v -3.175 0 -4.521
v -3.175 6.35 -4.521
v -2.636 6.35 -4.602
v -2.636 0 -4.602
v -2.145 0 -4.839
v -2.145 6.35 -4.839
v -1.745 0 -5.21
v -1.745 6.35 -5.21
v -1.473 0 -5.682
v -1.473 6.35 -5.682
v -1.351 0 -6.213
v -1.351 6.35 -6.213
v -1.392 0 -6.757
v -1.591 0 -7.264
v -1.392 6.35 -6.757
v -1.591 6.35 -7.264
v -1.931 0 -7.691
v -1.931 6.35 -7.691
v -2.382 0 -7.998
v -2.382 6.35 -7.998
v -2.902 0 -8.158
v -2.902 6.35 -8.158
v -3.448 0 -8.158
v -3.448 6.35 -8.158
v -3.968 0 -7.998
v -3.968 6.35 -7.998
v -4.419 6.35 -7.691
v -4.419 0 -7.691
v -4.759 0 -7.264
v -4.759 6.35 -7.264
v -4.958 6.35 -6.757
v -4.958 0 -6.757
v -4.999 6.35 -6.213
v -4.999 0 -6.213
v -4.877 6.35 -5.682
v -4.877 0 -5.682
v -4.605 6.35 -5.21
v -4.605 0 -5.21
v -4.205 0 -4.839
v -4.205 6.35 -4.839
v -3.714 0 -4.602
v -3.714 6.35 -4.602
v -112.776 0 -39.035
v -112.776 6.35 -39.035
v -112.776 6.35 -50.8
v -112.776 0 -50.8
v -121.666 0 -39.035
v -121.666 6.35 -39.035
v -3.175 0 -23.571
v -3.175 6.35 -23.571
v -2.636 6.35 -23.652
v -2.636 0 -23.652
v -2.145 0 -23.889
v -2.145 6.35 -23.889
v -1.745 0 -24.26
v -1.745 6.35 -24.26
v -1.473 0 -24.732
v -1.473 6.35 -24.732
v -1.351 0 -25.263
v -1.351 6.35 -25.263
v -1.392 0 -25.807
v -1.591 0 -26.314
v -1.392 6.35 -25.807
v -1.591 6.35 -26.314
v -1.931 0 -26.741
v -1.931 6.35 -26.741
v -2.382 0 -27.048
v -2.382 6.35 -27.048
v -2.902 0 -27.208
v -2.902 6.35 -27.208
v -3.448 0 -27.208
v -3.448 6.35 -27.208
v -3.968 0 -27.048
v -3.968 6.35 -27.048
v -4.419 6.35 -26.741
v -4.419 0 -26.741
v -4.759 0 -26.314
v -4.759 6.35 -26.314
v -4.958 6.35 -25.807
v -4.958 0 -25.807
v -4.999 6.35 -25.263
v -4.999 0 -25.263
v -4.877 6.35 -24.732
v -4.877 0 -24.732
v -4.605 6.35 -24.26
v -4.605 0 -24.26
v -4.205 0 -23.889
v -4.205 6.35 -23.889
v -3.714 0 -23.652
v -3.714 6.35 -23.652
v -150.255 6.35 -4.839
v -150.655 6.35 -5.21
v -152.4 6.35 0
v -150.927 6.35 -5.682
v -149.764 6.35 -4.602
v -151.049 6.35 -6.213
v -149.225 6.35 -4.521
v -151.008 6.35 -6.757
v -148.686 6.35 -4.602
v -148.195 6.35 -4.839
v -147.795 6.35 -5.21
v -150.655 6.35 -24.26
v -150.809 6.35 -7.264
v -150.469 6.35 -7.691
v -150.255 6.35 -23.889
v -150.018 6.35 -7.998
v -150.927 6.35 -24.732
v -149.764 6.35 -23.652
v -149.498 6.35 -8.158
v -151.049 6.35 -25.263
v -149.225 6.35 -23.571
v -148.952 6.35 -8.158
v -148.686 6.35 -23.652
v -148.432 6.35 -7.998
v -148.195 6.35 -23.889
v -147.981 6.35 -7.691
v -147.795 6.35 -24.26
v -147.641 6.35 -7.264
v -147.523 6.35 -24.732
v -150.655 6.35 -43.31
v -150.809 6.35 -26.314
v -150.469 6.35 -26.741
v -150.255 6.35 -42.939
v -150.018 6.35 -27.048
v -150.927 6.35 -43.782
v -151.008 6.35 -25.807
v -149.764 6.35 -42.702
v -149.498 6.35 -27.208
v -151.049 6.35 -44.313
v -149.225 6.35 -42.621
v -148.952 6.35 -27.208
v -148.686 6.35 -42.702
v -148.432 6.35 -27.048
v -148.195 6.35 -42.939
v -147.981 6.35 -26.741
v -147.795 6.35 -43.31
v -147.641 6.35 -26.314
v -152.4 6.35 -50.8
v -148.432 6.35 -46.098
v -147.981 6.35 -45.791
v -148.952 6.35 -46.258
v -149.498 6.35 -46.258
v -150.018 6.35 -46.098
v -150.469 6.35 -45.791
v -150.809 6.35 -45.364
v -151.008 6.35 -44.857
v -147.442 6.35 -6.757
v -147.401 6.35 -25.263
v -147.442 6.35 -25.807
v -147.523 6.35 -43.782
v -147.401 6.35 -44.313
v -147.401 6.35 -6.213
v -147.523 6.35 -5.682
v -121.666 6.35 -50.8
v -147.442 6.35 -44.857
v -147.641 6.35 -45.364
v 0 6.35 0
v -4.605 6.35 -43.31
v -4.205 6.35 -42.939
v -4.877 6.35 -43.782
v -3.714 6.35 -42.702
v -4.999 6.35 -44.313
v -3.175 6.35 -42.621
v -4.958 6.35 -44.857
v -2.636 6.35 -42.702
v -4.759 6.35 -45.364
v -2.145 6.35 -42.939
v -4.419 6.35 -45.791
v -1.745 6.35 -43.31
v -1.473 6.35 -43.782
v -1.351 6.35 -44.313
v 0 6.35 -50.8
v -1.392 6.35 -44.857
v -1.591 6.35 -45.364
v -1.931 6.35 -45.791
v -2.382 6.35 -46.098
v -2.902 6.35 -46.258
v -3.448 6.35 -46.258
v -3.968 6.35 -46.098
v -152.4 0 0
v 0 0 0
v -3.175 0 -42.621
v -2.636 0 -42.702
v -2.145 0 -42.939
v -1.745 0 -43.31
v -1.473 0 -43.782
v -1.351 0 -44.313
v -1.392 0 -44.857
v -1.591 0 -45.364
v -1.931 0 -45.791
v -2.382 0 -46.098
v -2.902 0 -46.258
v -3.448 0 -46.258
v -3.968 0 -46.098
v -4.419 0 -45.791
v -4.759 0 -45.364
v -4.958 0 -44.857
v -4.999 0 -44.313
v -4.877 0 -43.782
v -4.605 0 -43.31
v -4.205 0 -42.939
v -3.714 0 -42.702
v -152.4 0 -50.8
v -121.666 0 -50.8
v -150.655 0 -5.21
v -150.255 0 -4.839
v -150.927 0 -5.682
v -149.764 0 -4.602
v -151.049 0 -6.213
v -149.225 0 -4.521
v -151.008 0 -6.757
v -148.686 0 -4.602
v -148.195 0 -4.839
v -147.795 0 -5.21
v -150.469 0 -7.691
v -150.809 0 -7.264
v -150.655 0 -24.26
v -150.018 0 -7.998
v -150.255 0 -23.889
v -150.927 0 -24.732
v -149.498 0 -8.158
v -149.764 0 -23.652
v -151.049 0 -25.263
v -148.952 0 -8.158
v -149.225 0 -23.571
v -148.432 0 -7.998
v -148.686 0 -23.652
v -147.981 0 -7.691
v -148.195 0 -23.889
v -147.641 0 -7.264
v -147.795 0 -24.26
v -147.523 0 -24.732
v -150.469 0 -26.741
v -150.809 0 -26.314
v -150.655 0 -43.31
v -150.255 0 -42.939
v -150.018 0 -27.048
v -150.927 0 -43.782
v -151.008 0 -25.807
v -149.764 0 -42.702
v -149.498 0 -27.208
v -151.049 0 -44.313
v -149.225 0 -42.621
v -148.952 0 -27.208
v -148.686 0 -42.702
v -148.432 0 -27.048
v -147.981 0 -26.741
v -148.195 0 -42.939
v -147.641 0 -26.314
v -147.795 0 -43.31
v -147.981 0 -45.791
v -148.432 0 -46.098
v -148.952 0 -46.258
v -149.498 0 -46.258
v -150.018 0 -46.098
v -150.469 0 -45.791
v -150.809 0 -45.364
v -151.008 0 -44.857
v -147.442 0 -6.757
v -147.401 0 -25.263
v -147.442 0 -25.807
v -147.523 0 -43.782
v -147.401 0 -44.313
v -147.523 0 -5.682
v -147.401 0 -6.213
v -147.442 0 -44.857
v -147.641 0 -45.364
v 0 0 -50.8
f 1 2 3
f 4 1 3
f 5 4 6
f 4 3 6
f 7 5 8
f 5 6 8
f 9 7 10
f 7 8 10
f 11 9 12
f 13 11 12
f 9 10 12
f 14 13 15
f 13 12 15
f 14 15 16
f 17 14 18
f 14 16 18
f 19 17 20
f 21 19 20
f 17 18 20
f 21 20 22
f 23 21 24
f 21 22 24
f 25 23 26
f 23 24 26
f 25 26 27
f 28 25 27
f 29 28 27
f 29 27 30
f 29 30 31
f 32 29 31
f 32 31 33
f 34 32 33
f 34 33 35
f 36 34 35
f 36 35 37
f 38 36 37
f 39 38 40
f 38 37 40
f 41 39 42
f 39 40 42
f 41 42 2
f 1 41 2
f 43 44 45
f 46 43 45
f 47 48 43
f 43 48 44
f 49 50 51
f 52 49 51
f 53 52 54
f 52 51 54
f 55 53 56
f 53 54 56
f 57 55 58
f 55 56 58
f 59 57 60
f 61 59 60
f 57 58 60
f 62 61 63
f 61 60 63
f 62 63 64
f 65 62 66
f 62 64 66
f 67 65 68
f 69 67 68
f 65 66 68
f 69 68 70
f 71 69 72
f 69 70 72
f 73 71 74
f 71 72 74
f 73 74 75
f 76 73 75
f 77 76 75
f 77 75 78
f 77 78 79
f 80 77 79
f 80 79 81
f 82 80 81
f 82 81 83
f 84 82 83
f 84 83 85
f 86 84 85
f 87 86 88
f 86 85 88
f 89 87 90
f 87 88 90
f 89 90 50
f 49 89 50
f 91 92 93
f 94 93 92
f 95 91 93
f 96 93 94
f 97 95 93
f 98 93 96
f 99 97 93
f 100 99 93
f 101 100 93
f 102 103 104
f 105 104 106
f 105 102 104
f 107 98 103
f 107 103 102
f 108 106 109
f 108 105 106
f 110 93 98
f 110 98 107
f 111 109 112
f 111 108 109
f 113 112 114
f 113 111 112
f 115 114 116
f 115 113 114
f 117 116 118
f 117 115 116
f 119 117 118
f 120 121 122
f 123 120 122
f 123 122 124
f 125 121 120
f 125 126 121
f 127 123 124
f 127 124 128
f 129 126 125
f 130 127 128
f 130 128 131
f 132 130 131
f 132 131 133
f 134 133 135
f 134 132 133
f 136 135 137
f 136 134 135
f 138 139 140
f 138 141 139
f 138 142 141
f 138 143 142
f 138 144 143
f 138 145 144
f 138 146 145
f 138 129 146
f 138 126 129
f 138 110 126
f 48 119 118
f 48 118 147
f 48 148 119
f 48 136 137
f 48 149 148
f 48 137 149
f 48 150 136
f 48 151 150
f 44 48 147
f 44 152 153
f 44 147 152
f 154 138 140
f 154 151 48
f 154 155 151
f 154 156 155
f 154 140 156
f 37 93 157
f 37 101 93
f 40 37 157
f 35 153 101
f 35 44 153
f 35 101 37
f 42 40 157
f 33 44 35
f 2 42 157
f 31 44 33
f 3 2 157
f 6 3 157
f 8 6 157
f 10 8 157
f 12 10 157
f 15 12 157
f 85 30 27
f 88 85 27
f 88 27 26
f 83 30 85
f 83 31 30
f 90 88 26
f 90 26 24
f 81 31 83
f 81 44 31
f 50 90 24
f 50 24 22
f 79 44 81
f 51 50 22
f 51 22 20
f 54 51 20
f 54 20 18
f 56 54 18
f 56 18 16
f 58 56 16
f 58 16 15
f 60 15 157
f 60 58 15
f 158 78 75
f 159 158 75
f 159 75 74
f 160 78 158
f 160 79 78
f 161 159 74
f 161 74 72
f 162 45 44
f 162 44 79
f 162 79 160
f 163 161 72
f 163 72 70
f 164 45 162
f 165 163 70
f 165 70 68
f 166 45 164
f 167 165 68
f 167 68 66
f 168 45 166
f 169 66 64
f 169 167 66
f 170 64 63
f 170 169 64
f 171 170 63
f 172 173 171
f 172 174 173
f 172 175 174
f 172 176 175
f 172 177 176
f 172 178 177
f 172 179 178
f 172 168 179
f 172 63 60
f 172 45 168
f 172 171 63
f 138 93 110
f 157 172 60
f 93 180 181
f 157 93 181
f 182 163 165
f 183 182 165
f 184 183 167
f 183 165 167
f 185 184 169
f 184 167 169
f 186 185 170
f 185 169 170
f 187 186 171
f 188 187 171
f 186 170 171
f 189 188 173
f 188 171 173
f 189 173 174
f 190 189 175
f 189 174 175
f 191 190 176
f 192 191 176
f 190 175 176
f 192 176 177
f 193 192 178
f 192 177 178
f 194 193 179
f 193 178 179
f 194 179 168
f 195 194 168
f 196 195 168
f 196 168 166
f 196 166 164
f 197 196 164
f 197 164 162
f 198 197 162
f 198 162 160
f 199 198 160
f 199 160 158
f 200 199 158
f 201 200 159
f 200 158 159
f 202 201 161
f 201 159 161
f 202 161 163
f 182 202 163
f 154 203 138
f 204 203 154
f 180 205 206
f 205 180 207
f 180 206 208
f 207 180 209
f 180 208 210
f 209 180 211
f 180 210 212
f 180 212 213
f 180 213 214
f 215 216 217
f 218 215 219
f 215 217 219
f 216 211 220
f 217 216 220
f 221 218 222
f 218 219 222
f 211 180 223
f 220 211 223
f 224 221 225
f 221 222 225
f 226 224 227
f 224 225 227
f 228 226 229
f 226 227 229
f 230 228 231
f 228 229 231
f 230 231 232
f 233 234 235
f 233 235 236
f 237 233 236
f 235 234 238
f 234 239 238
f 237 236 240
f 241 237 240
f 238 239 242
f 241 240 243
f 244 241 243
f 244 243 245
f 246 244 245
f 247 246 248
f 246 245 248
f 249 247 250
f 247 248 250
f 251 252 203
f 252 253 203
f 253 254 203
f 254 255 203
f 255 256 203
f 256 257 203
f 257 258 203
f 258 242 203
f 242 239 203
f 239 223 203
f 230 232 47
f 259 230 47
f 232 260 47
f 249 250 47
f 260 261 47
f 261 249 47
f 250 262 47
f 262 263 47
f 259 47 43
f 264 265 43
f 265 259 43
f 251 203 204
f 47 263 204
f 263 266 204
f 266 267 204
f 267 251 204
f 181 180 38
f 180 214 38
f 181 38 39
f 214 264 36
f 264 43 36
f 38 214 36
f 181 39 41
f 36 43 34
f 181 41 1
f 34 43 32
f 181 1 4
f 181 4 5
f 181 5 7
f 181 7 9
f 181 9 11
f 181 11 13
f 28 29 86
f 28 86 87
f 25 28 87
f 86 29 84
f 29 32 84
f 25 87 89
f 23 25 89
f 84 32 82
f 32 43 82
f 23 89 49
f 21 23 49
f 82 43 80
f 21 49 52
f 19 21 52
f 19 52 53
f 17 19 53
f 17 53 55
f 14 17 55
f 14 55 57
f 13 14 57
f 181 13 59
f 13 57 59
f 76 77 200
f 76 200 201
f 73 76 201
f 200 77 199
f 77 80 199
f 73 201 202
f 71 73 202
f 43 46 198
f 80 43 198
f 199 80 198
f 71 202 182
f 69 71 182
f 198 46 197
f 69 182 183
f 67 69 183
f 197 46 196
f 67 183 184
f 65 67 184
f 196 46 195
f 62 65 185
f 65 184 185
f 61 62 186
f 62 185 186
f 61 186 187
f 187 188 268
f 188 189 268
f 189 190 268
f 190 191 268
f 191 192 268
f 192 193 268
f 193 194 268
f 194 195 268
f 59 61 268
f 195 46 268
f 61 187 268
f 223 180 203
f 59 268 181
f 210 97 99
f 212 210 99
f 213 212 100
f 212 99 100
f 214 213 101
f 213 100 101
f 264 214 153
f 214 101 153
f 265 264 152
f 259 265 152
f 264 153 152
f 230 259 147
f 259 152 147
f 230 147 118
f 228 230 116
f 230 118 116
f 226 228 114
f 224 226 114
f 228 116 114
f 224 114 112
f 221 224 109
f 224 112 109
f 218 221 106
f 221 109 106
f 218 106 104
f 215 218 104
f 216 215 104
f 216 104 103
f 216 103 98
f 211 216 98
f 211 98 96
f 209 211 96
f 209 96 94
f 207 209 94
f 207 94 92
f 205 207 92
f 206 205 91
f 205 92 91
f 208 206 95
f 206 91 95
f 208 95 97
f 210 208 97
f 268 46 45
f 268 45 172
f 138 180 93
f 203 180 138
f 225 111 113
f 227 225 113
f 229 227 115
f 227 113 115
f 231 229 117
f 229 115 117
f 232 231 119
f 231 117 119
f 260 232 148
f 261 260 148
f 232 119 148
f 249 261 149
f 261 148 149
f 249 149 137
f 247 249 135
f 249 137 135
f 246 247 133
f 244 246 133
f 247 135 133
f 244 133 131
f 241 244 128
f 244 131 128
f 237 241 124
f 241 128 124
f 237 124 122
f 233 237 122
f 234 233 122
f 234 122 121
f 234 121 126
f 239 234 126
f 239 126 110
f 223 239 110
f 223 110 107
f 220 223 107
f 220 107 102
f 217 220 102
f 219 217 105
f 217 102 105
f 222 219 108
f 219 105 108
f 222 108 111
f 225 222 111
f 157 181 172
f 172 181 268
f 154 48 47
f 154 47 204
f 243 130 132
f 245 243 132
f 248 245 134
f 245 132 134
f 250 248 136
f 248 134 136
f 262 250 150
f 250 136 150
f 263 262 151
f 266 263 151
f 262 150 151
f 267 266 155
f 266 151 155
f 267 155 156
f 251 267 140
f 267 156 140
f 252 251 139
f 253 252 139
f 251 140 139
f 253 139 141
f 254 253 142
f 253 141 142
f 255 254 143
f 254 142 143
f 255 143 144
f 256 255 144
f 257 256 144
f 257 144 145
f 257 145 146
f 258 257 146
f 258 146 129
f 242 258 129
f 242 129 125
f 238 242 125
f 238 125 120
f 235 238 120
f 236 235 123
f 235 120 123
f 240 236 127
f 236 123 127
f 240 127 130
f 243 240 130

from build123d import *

# Parameters (mm, degrees)
SKETCH1_W           = 152.4
SKETCH1_H           = 50.8
BOSS_EXTRUDE1_DEPTH = 6.35
SKETCH2_R           = 1.8288
CUT_EXTRUDE1_DEPTH  = 6.35
SKETCH5_W           = 8.89
SKETCH5_H           = 11.765011578
CUT_EXTRUDE2_DEPTH  = 161.769159045


with BuildPart() as part:
    # Sketch1 → Boss-Extrude1 (new body)
    with BuildSketch(Plane(origin=(0, 0, 0), x_dir=(1, 0, 0), z_dir=(0, 1, 0))):
        with Locations((-76.2, 25.4)):
            Rectangle(SKETCH1_W, SKETCH1_H)
    extrude(amount=BOSS_EXTRUDE1_DEPTH)

    # Sketch2 → Cut-Extrude1 (cut)
    with BuildSketch(Plane(origin=(0, 6.35, 0), x_dir=(1, 0, 0), z_dir=(0, 1, 0))):
        with Locations(Location((-149.225, 44.45, 0), (0, 0, 270))):
            Circle(SKETCH2_R)
        with Locations(Location((-149.225, 25.4, 0), (0, 0, 270))):
            Circle(SKETCH2_R)
        with Locations(Location((-149.225, 6.35, 0), (0, 0, 270))):
            Circle(SKETCH2_R)
        with Locations(Location((-3.175, 25.4, 0), (0, 0, 270))):
            Circle(SKETCH2_R)
        with Locations(Location((-3.175, 44.45, 0), (0, 0, 270))):
            Circle(SKETCH2_R)
        with Locations(Location((-3.175, 6.35, 0), (0, 0, 270))):
            Circle(SKETCH2_R)
    extrude(amount=-CUT_EXTRUDE1_DEPTH, mode=Mode.SUBTRACT)

    # Sketch5 → Cut-Extrude2 (cut, through all)
    with BuildSketch(Plane(origin=(0, 6.35, 0), x_dir=(1, 0, 0), z_dir=(0, 1, 0))):
        with Locations((-117.221, 44.917494211)):
            Rectangle(SKETCH5_W, SKETCH5_H)
    extrude(amount=-CUT_EXTRUDE2_DEPTH, mode=Mode.SUBTRACT)


solid = part.part
